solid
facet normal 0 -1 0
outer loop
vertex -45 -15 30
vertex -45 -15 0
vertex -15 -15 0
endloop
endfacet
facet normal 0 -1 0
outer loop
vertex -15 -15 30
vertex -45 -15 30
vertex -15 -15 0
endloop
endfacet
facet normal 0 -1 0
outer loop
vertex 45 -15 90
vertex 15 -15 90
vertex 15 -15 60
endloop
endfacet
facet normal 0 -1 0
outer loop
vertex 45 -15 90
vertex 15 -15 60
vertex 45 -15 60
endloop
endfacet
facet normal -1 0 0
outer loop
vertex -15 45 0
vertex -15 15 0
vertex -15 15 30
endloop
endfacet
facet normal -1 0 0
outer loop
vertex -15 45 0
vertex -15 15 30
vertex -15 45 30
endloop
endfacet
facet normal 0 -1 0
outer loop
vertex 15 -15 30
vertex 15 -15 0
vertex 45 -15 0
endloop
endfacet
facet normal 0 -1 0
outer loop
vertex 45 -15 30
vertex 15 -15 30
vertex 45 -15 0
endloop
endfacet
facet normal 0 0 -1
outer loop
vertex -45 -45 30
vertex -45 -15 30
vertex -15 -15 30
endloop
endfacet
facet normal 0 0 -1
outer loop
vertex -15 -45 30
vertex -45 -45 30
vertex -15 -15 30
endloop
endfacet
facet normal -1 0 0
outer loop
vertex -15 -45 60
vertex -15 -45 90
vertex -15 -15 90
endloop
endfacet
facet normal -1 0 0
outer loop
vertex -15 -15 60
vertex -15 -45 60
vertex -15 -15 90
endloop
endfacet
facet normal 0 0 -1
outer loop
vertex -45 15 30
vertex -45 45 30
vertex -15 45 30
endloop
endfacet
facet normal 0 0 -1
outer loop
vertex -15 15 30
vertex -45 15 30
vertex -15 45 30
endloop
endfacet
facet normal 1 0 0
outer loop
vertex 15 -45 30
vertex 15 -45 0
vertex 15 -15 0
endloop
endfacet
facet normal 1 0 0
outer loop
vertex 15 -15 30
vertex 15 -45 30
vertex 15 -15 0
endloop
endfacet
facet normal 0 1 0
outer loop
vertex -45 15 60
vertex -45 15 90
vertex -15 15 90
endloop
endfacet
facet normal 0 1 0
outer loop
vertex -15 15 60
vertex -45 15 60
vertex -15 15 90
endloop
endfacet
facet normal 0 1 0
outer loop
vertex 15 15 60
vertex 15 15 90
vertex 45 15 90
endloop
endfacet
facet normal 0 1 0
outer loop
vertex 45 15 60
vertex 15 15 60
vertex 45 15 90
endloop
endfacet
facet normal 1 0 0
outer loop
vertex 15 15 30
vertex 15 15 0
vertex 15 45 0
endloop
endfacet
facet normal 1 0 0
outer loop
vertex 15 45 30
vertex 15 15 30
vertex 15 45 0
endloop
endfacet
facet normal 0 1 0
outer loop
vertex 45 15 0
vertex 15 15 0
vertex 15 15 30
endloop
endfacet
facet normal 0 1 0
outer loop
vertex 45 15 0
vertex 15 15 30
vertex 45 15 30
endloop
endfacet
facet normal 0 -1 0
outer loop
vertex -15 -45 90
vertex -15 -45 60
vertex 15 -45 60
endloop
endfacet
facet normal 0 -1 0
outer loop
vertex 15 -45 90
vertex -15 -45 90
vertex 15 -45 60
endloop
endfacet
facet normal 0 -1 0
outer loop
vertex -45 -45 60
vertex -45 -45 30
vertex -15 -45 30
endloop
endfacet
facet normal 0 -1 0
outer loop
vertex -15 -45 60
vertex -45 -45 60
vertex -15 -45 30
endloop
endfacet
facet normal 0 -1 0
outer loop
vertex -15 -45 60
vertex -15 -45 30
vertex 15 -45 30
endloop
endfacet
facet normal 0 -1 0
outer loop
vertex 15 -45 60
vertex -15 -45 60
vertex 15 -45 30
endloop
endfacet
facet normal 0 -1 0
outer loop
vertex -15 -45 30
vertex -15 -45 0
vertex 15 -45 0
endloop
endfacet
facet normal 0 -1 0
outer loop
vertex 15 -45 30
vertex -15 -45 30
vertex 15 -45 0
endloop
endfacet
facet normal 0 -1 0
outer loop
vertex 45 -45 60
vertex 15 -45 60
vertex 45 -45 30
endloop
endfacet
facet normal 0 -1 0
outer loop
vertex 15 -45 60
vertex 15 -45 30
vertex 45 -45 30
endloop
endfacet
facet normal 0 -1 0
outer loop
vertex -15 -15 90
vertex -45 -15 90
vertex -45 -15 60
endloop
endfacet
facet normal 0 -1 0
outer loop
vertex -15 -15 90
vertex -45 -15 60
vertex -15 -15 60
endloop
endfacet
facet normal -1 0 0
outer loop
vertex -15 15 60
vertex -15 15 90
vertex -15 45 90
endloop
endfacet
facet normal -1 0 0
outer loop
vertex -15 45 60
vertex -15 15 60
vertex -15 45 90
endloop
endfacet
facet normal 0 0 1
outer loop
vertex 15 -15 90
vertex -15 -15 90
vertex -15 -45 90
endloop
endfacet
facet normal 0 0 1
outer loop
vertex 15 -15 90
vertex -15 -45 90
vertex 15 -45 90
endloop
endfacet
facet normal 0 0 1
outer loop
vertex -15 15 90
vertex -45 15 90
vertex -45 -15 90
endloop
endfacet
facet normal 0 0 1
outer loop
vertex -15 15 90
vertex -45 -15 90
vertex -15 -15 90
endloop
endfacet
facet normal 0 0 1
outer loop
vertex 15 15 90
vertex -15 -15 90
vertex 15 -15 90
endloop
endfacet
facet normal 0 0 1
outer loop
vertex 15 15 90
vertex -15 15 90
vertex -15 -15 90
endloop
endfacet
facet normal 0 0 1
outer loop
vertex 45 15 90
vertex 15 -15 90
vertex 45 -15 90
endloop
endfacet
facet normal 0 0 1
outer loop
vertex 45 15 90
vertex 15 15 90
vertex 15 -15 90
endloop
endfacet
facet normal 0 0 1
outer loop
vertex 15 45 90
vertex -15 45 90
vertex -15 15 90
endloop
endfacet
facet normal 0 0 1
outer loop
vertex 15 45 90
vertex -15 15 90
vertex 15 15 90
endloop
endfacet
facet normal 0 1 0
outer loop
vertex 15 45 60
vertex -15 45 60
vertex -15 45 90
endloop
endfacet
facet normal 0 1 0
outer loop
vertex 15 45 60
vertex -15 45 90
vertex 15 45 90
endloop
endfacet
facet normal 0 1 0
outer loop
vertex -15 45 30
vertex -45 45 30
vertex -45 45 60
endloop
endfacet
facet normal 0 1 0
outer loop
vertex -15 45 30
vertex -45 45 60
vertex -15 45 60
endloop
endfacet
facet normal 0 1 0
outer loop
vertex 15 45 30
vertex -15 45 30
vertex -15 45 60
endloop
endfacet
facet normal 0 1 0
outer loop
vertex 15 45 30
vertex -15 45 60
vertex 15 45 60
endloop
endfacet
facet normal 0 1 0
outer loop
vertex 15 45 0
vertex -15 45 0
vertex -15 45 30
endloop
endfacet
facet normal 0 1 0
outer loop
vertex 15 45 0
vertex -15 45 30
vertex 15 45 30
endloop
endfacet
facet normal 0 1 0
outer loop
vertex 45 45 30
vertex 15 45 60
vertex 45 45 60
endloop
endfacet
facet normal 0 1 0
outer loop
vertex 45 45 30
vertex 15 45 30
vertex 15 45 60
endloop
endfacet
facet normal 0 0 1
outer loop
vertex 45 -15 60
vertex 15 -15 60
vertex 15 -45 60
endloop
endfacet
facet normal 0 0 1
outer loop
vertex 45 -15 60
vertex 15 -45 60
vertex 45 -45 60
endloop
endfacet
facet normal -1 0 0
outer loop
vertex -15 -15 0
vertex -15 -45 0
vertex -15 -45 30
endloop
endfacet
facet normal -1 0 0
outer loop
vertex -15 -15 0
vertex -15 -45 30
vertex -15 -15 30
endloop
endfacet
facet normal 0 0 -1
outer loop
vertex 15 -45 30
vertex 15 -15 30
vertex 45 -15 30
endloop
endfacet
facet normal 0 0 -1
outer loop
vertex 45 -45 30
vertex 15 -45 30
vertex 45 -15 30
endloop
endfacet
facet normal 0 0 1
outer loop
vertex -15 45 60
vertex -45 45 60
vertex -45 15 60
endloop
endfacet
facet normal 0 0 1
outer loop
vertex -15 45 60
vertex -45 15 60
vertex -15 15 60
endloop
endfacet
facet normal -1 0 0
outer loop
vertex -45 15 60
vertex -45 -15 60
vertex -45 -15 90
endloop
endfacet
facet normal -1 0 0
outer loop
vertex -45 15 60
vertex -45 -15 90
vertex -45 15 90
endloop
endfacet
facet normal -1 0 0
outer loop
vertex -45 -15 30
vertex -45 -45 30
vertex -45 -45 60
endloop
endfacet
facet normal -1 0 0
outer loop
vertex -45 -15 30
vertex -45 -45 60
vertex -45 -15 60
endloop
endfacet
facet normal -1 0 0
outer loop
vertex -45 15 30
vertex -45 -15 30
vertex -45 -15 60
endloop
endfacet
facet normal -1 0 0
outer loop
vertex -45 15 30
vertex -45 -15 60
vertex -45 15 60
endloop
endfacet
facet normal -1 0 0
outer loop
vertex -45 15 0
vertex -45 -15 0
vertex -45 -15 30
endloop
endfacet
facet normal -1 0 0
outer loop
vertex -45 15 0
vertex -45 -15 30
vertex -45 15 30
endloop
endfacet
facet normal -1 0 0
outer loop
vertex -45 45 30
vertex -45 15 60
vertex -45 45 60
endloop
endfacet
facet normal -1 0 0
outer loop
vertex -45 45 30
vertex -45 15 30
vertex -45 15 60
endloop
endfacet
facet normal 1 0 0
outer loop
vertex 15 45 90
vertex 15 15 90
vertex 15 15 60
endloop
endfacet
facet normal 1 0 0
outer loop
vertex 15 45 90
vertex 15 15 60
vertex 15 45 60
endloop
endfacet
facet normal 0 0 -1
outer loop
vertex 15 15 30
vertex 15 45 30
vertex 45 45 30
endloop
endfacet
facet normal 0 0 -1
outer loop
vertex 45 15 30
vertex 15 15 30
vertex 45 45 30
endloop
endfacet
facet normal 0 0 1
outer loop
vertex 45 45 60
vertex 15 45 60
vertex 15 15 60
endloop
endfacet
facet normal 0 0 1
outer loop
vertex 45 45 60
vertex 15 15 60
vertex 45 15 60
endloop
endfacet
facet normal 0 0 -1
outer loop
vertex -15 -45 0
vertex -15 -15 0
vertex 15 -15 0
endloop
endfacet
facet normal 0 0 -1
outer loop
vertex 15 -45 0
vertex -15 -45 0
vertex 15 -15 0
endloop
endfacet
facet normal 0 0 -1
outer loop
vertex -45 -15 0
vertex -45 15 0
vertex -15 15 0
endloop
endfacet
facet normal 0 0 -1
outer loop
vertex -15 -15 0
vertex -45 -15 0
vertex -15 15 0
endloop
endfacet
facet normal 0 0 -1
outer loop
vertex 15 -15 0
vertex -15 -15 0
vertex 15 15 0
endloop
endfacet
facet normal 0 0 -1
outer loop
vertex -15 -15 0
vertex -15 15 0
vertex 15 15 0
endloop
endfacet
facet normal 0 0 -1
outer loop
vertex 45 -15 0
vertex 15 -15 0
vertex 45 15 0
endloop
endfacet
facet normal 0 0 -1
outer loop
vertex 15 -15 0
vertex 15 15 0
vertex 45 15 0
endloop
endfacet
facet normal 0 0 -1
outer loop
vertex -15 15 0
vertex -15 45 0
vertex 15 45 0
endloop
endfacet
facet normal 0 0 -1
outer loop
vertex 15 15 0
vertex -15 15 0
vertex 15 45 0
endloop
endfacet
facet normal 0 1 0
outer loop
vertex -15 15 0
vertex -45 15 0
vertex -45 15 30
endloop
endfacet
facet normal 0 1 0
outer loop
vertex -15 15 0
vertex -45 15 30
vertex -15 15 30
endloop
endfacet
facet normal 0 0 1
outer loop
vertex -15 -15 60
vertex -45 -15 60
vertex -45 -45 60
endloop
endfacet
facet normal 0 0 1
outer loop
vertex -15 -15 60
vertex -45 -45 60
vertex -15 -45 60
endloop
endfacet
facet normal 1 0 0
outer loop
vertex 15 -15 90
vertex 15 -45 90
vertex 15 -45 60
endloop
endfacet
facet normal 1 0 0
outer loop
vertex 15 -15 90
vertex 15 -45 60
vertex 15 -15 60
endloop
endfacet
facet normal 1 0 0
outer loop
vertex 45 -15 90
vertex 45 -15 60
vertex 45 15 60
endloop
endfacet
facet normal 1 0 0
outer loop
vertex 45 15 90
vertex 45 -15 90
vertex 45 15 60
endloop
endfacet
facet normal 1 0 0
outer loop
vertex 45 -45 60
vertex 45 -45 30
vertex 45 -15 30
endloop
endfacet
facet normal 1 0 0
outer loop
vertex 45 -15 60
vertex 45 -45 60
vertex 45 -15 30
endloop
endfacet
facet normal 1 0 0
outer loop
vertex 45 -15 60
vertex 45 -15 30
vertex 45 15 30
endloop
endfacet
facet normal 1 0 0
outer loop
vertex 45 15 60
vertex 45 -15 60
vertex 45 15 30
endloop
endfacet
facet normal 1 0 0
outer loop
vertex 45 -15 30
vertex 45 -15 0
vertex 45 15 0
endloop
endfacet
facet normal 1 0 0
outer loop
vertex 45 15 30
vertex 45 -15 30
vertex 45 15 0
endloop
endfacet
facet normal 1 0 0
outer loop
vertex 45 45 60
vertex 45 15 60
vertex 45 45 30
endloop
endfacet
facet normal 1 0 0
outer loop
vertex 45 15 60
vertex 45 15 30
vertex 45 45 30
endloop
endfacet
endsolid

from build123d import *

# Parameters (mm, degrees)
F0_W     = 90
F0_H     = 90
F1_DEPTH = 90
F3_W     = 30
F3_H     = 30
F4_DEPTH = 30
F2_W     = 30
F2_H     = 30
F5_DEPTH = 30


with BuildPart() as f1:
    # F0 (on Top) → F1 (new body)
    with BuildSketch(Plane.XY):
        Rectangle(F0_W, F0_H)
    extrude(amount=F1_DEPTH)

    # F3 (on face) → F4 (cut)
    with BuildSketch(Plane.XY.offset(90)):
        with Locations((-30, -30)):
            Rectangle(F3_W, F3_H)
        with Locations((-30, 30)):
            Rectangle(F3_W, F3_H)
        with Locations((30, 30)):
            Rectangle(F3_W, F3_H)
        with Locations((30, -30)):
            Rectangle(F3_W, F3_H)
    extrude(amount=-F4_DEPTH, mode=Mode.SUBTRACT)

    # F2 (on Top) → F5 (cut)
    with BuildSketch(Plane.XY):
        with Locations((30, 30)):
            Rectangle(F2_W, F2_H)
        with Locations((-30, 30)):
            Rectangle(F2_W, F2_H)
        with Locations((-30, -30)):
            Rectangle(F2_W, F2_H)
        with Locations((30, -30)):
            Rectangle(F2_W, F2_H)
    extrude(amount=F5_DEPTH, mode=Mode.SUBTRACT)


solid = f1.part
